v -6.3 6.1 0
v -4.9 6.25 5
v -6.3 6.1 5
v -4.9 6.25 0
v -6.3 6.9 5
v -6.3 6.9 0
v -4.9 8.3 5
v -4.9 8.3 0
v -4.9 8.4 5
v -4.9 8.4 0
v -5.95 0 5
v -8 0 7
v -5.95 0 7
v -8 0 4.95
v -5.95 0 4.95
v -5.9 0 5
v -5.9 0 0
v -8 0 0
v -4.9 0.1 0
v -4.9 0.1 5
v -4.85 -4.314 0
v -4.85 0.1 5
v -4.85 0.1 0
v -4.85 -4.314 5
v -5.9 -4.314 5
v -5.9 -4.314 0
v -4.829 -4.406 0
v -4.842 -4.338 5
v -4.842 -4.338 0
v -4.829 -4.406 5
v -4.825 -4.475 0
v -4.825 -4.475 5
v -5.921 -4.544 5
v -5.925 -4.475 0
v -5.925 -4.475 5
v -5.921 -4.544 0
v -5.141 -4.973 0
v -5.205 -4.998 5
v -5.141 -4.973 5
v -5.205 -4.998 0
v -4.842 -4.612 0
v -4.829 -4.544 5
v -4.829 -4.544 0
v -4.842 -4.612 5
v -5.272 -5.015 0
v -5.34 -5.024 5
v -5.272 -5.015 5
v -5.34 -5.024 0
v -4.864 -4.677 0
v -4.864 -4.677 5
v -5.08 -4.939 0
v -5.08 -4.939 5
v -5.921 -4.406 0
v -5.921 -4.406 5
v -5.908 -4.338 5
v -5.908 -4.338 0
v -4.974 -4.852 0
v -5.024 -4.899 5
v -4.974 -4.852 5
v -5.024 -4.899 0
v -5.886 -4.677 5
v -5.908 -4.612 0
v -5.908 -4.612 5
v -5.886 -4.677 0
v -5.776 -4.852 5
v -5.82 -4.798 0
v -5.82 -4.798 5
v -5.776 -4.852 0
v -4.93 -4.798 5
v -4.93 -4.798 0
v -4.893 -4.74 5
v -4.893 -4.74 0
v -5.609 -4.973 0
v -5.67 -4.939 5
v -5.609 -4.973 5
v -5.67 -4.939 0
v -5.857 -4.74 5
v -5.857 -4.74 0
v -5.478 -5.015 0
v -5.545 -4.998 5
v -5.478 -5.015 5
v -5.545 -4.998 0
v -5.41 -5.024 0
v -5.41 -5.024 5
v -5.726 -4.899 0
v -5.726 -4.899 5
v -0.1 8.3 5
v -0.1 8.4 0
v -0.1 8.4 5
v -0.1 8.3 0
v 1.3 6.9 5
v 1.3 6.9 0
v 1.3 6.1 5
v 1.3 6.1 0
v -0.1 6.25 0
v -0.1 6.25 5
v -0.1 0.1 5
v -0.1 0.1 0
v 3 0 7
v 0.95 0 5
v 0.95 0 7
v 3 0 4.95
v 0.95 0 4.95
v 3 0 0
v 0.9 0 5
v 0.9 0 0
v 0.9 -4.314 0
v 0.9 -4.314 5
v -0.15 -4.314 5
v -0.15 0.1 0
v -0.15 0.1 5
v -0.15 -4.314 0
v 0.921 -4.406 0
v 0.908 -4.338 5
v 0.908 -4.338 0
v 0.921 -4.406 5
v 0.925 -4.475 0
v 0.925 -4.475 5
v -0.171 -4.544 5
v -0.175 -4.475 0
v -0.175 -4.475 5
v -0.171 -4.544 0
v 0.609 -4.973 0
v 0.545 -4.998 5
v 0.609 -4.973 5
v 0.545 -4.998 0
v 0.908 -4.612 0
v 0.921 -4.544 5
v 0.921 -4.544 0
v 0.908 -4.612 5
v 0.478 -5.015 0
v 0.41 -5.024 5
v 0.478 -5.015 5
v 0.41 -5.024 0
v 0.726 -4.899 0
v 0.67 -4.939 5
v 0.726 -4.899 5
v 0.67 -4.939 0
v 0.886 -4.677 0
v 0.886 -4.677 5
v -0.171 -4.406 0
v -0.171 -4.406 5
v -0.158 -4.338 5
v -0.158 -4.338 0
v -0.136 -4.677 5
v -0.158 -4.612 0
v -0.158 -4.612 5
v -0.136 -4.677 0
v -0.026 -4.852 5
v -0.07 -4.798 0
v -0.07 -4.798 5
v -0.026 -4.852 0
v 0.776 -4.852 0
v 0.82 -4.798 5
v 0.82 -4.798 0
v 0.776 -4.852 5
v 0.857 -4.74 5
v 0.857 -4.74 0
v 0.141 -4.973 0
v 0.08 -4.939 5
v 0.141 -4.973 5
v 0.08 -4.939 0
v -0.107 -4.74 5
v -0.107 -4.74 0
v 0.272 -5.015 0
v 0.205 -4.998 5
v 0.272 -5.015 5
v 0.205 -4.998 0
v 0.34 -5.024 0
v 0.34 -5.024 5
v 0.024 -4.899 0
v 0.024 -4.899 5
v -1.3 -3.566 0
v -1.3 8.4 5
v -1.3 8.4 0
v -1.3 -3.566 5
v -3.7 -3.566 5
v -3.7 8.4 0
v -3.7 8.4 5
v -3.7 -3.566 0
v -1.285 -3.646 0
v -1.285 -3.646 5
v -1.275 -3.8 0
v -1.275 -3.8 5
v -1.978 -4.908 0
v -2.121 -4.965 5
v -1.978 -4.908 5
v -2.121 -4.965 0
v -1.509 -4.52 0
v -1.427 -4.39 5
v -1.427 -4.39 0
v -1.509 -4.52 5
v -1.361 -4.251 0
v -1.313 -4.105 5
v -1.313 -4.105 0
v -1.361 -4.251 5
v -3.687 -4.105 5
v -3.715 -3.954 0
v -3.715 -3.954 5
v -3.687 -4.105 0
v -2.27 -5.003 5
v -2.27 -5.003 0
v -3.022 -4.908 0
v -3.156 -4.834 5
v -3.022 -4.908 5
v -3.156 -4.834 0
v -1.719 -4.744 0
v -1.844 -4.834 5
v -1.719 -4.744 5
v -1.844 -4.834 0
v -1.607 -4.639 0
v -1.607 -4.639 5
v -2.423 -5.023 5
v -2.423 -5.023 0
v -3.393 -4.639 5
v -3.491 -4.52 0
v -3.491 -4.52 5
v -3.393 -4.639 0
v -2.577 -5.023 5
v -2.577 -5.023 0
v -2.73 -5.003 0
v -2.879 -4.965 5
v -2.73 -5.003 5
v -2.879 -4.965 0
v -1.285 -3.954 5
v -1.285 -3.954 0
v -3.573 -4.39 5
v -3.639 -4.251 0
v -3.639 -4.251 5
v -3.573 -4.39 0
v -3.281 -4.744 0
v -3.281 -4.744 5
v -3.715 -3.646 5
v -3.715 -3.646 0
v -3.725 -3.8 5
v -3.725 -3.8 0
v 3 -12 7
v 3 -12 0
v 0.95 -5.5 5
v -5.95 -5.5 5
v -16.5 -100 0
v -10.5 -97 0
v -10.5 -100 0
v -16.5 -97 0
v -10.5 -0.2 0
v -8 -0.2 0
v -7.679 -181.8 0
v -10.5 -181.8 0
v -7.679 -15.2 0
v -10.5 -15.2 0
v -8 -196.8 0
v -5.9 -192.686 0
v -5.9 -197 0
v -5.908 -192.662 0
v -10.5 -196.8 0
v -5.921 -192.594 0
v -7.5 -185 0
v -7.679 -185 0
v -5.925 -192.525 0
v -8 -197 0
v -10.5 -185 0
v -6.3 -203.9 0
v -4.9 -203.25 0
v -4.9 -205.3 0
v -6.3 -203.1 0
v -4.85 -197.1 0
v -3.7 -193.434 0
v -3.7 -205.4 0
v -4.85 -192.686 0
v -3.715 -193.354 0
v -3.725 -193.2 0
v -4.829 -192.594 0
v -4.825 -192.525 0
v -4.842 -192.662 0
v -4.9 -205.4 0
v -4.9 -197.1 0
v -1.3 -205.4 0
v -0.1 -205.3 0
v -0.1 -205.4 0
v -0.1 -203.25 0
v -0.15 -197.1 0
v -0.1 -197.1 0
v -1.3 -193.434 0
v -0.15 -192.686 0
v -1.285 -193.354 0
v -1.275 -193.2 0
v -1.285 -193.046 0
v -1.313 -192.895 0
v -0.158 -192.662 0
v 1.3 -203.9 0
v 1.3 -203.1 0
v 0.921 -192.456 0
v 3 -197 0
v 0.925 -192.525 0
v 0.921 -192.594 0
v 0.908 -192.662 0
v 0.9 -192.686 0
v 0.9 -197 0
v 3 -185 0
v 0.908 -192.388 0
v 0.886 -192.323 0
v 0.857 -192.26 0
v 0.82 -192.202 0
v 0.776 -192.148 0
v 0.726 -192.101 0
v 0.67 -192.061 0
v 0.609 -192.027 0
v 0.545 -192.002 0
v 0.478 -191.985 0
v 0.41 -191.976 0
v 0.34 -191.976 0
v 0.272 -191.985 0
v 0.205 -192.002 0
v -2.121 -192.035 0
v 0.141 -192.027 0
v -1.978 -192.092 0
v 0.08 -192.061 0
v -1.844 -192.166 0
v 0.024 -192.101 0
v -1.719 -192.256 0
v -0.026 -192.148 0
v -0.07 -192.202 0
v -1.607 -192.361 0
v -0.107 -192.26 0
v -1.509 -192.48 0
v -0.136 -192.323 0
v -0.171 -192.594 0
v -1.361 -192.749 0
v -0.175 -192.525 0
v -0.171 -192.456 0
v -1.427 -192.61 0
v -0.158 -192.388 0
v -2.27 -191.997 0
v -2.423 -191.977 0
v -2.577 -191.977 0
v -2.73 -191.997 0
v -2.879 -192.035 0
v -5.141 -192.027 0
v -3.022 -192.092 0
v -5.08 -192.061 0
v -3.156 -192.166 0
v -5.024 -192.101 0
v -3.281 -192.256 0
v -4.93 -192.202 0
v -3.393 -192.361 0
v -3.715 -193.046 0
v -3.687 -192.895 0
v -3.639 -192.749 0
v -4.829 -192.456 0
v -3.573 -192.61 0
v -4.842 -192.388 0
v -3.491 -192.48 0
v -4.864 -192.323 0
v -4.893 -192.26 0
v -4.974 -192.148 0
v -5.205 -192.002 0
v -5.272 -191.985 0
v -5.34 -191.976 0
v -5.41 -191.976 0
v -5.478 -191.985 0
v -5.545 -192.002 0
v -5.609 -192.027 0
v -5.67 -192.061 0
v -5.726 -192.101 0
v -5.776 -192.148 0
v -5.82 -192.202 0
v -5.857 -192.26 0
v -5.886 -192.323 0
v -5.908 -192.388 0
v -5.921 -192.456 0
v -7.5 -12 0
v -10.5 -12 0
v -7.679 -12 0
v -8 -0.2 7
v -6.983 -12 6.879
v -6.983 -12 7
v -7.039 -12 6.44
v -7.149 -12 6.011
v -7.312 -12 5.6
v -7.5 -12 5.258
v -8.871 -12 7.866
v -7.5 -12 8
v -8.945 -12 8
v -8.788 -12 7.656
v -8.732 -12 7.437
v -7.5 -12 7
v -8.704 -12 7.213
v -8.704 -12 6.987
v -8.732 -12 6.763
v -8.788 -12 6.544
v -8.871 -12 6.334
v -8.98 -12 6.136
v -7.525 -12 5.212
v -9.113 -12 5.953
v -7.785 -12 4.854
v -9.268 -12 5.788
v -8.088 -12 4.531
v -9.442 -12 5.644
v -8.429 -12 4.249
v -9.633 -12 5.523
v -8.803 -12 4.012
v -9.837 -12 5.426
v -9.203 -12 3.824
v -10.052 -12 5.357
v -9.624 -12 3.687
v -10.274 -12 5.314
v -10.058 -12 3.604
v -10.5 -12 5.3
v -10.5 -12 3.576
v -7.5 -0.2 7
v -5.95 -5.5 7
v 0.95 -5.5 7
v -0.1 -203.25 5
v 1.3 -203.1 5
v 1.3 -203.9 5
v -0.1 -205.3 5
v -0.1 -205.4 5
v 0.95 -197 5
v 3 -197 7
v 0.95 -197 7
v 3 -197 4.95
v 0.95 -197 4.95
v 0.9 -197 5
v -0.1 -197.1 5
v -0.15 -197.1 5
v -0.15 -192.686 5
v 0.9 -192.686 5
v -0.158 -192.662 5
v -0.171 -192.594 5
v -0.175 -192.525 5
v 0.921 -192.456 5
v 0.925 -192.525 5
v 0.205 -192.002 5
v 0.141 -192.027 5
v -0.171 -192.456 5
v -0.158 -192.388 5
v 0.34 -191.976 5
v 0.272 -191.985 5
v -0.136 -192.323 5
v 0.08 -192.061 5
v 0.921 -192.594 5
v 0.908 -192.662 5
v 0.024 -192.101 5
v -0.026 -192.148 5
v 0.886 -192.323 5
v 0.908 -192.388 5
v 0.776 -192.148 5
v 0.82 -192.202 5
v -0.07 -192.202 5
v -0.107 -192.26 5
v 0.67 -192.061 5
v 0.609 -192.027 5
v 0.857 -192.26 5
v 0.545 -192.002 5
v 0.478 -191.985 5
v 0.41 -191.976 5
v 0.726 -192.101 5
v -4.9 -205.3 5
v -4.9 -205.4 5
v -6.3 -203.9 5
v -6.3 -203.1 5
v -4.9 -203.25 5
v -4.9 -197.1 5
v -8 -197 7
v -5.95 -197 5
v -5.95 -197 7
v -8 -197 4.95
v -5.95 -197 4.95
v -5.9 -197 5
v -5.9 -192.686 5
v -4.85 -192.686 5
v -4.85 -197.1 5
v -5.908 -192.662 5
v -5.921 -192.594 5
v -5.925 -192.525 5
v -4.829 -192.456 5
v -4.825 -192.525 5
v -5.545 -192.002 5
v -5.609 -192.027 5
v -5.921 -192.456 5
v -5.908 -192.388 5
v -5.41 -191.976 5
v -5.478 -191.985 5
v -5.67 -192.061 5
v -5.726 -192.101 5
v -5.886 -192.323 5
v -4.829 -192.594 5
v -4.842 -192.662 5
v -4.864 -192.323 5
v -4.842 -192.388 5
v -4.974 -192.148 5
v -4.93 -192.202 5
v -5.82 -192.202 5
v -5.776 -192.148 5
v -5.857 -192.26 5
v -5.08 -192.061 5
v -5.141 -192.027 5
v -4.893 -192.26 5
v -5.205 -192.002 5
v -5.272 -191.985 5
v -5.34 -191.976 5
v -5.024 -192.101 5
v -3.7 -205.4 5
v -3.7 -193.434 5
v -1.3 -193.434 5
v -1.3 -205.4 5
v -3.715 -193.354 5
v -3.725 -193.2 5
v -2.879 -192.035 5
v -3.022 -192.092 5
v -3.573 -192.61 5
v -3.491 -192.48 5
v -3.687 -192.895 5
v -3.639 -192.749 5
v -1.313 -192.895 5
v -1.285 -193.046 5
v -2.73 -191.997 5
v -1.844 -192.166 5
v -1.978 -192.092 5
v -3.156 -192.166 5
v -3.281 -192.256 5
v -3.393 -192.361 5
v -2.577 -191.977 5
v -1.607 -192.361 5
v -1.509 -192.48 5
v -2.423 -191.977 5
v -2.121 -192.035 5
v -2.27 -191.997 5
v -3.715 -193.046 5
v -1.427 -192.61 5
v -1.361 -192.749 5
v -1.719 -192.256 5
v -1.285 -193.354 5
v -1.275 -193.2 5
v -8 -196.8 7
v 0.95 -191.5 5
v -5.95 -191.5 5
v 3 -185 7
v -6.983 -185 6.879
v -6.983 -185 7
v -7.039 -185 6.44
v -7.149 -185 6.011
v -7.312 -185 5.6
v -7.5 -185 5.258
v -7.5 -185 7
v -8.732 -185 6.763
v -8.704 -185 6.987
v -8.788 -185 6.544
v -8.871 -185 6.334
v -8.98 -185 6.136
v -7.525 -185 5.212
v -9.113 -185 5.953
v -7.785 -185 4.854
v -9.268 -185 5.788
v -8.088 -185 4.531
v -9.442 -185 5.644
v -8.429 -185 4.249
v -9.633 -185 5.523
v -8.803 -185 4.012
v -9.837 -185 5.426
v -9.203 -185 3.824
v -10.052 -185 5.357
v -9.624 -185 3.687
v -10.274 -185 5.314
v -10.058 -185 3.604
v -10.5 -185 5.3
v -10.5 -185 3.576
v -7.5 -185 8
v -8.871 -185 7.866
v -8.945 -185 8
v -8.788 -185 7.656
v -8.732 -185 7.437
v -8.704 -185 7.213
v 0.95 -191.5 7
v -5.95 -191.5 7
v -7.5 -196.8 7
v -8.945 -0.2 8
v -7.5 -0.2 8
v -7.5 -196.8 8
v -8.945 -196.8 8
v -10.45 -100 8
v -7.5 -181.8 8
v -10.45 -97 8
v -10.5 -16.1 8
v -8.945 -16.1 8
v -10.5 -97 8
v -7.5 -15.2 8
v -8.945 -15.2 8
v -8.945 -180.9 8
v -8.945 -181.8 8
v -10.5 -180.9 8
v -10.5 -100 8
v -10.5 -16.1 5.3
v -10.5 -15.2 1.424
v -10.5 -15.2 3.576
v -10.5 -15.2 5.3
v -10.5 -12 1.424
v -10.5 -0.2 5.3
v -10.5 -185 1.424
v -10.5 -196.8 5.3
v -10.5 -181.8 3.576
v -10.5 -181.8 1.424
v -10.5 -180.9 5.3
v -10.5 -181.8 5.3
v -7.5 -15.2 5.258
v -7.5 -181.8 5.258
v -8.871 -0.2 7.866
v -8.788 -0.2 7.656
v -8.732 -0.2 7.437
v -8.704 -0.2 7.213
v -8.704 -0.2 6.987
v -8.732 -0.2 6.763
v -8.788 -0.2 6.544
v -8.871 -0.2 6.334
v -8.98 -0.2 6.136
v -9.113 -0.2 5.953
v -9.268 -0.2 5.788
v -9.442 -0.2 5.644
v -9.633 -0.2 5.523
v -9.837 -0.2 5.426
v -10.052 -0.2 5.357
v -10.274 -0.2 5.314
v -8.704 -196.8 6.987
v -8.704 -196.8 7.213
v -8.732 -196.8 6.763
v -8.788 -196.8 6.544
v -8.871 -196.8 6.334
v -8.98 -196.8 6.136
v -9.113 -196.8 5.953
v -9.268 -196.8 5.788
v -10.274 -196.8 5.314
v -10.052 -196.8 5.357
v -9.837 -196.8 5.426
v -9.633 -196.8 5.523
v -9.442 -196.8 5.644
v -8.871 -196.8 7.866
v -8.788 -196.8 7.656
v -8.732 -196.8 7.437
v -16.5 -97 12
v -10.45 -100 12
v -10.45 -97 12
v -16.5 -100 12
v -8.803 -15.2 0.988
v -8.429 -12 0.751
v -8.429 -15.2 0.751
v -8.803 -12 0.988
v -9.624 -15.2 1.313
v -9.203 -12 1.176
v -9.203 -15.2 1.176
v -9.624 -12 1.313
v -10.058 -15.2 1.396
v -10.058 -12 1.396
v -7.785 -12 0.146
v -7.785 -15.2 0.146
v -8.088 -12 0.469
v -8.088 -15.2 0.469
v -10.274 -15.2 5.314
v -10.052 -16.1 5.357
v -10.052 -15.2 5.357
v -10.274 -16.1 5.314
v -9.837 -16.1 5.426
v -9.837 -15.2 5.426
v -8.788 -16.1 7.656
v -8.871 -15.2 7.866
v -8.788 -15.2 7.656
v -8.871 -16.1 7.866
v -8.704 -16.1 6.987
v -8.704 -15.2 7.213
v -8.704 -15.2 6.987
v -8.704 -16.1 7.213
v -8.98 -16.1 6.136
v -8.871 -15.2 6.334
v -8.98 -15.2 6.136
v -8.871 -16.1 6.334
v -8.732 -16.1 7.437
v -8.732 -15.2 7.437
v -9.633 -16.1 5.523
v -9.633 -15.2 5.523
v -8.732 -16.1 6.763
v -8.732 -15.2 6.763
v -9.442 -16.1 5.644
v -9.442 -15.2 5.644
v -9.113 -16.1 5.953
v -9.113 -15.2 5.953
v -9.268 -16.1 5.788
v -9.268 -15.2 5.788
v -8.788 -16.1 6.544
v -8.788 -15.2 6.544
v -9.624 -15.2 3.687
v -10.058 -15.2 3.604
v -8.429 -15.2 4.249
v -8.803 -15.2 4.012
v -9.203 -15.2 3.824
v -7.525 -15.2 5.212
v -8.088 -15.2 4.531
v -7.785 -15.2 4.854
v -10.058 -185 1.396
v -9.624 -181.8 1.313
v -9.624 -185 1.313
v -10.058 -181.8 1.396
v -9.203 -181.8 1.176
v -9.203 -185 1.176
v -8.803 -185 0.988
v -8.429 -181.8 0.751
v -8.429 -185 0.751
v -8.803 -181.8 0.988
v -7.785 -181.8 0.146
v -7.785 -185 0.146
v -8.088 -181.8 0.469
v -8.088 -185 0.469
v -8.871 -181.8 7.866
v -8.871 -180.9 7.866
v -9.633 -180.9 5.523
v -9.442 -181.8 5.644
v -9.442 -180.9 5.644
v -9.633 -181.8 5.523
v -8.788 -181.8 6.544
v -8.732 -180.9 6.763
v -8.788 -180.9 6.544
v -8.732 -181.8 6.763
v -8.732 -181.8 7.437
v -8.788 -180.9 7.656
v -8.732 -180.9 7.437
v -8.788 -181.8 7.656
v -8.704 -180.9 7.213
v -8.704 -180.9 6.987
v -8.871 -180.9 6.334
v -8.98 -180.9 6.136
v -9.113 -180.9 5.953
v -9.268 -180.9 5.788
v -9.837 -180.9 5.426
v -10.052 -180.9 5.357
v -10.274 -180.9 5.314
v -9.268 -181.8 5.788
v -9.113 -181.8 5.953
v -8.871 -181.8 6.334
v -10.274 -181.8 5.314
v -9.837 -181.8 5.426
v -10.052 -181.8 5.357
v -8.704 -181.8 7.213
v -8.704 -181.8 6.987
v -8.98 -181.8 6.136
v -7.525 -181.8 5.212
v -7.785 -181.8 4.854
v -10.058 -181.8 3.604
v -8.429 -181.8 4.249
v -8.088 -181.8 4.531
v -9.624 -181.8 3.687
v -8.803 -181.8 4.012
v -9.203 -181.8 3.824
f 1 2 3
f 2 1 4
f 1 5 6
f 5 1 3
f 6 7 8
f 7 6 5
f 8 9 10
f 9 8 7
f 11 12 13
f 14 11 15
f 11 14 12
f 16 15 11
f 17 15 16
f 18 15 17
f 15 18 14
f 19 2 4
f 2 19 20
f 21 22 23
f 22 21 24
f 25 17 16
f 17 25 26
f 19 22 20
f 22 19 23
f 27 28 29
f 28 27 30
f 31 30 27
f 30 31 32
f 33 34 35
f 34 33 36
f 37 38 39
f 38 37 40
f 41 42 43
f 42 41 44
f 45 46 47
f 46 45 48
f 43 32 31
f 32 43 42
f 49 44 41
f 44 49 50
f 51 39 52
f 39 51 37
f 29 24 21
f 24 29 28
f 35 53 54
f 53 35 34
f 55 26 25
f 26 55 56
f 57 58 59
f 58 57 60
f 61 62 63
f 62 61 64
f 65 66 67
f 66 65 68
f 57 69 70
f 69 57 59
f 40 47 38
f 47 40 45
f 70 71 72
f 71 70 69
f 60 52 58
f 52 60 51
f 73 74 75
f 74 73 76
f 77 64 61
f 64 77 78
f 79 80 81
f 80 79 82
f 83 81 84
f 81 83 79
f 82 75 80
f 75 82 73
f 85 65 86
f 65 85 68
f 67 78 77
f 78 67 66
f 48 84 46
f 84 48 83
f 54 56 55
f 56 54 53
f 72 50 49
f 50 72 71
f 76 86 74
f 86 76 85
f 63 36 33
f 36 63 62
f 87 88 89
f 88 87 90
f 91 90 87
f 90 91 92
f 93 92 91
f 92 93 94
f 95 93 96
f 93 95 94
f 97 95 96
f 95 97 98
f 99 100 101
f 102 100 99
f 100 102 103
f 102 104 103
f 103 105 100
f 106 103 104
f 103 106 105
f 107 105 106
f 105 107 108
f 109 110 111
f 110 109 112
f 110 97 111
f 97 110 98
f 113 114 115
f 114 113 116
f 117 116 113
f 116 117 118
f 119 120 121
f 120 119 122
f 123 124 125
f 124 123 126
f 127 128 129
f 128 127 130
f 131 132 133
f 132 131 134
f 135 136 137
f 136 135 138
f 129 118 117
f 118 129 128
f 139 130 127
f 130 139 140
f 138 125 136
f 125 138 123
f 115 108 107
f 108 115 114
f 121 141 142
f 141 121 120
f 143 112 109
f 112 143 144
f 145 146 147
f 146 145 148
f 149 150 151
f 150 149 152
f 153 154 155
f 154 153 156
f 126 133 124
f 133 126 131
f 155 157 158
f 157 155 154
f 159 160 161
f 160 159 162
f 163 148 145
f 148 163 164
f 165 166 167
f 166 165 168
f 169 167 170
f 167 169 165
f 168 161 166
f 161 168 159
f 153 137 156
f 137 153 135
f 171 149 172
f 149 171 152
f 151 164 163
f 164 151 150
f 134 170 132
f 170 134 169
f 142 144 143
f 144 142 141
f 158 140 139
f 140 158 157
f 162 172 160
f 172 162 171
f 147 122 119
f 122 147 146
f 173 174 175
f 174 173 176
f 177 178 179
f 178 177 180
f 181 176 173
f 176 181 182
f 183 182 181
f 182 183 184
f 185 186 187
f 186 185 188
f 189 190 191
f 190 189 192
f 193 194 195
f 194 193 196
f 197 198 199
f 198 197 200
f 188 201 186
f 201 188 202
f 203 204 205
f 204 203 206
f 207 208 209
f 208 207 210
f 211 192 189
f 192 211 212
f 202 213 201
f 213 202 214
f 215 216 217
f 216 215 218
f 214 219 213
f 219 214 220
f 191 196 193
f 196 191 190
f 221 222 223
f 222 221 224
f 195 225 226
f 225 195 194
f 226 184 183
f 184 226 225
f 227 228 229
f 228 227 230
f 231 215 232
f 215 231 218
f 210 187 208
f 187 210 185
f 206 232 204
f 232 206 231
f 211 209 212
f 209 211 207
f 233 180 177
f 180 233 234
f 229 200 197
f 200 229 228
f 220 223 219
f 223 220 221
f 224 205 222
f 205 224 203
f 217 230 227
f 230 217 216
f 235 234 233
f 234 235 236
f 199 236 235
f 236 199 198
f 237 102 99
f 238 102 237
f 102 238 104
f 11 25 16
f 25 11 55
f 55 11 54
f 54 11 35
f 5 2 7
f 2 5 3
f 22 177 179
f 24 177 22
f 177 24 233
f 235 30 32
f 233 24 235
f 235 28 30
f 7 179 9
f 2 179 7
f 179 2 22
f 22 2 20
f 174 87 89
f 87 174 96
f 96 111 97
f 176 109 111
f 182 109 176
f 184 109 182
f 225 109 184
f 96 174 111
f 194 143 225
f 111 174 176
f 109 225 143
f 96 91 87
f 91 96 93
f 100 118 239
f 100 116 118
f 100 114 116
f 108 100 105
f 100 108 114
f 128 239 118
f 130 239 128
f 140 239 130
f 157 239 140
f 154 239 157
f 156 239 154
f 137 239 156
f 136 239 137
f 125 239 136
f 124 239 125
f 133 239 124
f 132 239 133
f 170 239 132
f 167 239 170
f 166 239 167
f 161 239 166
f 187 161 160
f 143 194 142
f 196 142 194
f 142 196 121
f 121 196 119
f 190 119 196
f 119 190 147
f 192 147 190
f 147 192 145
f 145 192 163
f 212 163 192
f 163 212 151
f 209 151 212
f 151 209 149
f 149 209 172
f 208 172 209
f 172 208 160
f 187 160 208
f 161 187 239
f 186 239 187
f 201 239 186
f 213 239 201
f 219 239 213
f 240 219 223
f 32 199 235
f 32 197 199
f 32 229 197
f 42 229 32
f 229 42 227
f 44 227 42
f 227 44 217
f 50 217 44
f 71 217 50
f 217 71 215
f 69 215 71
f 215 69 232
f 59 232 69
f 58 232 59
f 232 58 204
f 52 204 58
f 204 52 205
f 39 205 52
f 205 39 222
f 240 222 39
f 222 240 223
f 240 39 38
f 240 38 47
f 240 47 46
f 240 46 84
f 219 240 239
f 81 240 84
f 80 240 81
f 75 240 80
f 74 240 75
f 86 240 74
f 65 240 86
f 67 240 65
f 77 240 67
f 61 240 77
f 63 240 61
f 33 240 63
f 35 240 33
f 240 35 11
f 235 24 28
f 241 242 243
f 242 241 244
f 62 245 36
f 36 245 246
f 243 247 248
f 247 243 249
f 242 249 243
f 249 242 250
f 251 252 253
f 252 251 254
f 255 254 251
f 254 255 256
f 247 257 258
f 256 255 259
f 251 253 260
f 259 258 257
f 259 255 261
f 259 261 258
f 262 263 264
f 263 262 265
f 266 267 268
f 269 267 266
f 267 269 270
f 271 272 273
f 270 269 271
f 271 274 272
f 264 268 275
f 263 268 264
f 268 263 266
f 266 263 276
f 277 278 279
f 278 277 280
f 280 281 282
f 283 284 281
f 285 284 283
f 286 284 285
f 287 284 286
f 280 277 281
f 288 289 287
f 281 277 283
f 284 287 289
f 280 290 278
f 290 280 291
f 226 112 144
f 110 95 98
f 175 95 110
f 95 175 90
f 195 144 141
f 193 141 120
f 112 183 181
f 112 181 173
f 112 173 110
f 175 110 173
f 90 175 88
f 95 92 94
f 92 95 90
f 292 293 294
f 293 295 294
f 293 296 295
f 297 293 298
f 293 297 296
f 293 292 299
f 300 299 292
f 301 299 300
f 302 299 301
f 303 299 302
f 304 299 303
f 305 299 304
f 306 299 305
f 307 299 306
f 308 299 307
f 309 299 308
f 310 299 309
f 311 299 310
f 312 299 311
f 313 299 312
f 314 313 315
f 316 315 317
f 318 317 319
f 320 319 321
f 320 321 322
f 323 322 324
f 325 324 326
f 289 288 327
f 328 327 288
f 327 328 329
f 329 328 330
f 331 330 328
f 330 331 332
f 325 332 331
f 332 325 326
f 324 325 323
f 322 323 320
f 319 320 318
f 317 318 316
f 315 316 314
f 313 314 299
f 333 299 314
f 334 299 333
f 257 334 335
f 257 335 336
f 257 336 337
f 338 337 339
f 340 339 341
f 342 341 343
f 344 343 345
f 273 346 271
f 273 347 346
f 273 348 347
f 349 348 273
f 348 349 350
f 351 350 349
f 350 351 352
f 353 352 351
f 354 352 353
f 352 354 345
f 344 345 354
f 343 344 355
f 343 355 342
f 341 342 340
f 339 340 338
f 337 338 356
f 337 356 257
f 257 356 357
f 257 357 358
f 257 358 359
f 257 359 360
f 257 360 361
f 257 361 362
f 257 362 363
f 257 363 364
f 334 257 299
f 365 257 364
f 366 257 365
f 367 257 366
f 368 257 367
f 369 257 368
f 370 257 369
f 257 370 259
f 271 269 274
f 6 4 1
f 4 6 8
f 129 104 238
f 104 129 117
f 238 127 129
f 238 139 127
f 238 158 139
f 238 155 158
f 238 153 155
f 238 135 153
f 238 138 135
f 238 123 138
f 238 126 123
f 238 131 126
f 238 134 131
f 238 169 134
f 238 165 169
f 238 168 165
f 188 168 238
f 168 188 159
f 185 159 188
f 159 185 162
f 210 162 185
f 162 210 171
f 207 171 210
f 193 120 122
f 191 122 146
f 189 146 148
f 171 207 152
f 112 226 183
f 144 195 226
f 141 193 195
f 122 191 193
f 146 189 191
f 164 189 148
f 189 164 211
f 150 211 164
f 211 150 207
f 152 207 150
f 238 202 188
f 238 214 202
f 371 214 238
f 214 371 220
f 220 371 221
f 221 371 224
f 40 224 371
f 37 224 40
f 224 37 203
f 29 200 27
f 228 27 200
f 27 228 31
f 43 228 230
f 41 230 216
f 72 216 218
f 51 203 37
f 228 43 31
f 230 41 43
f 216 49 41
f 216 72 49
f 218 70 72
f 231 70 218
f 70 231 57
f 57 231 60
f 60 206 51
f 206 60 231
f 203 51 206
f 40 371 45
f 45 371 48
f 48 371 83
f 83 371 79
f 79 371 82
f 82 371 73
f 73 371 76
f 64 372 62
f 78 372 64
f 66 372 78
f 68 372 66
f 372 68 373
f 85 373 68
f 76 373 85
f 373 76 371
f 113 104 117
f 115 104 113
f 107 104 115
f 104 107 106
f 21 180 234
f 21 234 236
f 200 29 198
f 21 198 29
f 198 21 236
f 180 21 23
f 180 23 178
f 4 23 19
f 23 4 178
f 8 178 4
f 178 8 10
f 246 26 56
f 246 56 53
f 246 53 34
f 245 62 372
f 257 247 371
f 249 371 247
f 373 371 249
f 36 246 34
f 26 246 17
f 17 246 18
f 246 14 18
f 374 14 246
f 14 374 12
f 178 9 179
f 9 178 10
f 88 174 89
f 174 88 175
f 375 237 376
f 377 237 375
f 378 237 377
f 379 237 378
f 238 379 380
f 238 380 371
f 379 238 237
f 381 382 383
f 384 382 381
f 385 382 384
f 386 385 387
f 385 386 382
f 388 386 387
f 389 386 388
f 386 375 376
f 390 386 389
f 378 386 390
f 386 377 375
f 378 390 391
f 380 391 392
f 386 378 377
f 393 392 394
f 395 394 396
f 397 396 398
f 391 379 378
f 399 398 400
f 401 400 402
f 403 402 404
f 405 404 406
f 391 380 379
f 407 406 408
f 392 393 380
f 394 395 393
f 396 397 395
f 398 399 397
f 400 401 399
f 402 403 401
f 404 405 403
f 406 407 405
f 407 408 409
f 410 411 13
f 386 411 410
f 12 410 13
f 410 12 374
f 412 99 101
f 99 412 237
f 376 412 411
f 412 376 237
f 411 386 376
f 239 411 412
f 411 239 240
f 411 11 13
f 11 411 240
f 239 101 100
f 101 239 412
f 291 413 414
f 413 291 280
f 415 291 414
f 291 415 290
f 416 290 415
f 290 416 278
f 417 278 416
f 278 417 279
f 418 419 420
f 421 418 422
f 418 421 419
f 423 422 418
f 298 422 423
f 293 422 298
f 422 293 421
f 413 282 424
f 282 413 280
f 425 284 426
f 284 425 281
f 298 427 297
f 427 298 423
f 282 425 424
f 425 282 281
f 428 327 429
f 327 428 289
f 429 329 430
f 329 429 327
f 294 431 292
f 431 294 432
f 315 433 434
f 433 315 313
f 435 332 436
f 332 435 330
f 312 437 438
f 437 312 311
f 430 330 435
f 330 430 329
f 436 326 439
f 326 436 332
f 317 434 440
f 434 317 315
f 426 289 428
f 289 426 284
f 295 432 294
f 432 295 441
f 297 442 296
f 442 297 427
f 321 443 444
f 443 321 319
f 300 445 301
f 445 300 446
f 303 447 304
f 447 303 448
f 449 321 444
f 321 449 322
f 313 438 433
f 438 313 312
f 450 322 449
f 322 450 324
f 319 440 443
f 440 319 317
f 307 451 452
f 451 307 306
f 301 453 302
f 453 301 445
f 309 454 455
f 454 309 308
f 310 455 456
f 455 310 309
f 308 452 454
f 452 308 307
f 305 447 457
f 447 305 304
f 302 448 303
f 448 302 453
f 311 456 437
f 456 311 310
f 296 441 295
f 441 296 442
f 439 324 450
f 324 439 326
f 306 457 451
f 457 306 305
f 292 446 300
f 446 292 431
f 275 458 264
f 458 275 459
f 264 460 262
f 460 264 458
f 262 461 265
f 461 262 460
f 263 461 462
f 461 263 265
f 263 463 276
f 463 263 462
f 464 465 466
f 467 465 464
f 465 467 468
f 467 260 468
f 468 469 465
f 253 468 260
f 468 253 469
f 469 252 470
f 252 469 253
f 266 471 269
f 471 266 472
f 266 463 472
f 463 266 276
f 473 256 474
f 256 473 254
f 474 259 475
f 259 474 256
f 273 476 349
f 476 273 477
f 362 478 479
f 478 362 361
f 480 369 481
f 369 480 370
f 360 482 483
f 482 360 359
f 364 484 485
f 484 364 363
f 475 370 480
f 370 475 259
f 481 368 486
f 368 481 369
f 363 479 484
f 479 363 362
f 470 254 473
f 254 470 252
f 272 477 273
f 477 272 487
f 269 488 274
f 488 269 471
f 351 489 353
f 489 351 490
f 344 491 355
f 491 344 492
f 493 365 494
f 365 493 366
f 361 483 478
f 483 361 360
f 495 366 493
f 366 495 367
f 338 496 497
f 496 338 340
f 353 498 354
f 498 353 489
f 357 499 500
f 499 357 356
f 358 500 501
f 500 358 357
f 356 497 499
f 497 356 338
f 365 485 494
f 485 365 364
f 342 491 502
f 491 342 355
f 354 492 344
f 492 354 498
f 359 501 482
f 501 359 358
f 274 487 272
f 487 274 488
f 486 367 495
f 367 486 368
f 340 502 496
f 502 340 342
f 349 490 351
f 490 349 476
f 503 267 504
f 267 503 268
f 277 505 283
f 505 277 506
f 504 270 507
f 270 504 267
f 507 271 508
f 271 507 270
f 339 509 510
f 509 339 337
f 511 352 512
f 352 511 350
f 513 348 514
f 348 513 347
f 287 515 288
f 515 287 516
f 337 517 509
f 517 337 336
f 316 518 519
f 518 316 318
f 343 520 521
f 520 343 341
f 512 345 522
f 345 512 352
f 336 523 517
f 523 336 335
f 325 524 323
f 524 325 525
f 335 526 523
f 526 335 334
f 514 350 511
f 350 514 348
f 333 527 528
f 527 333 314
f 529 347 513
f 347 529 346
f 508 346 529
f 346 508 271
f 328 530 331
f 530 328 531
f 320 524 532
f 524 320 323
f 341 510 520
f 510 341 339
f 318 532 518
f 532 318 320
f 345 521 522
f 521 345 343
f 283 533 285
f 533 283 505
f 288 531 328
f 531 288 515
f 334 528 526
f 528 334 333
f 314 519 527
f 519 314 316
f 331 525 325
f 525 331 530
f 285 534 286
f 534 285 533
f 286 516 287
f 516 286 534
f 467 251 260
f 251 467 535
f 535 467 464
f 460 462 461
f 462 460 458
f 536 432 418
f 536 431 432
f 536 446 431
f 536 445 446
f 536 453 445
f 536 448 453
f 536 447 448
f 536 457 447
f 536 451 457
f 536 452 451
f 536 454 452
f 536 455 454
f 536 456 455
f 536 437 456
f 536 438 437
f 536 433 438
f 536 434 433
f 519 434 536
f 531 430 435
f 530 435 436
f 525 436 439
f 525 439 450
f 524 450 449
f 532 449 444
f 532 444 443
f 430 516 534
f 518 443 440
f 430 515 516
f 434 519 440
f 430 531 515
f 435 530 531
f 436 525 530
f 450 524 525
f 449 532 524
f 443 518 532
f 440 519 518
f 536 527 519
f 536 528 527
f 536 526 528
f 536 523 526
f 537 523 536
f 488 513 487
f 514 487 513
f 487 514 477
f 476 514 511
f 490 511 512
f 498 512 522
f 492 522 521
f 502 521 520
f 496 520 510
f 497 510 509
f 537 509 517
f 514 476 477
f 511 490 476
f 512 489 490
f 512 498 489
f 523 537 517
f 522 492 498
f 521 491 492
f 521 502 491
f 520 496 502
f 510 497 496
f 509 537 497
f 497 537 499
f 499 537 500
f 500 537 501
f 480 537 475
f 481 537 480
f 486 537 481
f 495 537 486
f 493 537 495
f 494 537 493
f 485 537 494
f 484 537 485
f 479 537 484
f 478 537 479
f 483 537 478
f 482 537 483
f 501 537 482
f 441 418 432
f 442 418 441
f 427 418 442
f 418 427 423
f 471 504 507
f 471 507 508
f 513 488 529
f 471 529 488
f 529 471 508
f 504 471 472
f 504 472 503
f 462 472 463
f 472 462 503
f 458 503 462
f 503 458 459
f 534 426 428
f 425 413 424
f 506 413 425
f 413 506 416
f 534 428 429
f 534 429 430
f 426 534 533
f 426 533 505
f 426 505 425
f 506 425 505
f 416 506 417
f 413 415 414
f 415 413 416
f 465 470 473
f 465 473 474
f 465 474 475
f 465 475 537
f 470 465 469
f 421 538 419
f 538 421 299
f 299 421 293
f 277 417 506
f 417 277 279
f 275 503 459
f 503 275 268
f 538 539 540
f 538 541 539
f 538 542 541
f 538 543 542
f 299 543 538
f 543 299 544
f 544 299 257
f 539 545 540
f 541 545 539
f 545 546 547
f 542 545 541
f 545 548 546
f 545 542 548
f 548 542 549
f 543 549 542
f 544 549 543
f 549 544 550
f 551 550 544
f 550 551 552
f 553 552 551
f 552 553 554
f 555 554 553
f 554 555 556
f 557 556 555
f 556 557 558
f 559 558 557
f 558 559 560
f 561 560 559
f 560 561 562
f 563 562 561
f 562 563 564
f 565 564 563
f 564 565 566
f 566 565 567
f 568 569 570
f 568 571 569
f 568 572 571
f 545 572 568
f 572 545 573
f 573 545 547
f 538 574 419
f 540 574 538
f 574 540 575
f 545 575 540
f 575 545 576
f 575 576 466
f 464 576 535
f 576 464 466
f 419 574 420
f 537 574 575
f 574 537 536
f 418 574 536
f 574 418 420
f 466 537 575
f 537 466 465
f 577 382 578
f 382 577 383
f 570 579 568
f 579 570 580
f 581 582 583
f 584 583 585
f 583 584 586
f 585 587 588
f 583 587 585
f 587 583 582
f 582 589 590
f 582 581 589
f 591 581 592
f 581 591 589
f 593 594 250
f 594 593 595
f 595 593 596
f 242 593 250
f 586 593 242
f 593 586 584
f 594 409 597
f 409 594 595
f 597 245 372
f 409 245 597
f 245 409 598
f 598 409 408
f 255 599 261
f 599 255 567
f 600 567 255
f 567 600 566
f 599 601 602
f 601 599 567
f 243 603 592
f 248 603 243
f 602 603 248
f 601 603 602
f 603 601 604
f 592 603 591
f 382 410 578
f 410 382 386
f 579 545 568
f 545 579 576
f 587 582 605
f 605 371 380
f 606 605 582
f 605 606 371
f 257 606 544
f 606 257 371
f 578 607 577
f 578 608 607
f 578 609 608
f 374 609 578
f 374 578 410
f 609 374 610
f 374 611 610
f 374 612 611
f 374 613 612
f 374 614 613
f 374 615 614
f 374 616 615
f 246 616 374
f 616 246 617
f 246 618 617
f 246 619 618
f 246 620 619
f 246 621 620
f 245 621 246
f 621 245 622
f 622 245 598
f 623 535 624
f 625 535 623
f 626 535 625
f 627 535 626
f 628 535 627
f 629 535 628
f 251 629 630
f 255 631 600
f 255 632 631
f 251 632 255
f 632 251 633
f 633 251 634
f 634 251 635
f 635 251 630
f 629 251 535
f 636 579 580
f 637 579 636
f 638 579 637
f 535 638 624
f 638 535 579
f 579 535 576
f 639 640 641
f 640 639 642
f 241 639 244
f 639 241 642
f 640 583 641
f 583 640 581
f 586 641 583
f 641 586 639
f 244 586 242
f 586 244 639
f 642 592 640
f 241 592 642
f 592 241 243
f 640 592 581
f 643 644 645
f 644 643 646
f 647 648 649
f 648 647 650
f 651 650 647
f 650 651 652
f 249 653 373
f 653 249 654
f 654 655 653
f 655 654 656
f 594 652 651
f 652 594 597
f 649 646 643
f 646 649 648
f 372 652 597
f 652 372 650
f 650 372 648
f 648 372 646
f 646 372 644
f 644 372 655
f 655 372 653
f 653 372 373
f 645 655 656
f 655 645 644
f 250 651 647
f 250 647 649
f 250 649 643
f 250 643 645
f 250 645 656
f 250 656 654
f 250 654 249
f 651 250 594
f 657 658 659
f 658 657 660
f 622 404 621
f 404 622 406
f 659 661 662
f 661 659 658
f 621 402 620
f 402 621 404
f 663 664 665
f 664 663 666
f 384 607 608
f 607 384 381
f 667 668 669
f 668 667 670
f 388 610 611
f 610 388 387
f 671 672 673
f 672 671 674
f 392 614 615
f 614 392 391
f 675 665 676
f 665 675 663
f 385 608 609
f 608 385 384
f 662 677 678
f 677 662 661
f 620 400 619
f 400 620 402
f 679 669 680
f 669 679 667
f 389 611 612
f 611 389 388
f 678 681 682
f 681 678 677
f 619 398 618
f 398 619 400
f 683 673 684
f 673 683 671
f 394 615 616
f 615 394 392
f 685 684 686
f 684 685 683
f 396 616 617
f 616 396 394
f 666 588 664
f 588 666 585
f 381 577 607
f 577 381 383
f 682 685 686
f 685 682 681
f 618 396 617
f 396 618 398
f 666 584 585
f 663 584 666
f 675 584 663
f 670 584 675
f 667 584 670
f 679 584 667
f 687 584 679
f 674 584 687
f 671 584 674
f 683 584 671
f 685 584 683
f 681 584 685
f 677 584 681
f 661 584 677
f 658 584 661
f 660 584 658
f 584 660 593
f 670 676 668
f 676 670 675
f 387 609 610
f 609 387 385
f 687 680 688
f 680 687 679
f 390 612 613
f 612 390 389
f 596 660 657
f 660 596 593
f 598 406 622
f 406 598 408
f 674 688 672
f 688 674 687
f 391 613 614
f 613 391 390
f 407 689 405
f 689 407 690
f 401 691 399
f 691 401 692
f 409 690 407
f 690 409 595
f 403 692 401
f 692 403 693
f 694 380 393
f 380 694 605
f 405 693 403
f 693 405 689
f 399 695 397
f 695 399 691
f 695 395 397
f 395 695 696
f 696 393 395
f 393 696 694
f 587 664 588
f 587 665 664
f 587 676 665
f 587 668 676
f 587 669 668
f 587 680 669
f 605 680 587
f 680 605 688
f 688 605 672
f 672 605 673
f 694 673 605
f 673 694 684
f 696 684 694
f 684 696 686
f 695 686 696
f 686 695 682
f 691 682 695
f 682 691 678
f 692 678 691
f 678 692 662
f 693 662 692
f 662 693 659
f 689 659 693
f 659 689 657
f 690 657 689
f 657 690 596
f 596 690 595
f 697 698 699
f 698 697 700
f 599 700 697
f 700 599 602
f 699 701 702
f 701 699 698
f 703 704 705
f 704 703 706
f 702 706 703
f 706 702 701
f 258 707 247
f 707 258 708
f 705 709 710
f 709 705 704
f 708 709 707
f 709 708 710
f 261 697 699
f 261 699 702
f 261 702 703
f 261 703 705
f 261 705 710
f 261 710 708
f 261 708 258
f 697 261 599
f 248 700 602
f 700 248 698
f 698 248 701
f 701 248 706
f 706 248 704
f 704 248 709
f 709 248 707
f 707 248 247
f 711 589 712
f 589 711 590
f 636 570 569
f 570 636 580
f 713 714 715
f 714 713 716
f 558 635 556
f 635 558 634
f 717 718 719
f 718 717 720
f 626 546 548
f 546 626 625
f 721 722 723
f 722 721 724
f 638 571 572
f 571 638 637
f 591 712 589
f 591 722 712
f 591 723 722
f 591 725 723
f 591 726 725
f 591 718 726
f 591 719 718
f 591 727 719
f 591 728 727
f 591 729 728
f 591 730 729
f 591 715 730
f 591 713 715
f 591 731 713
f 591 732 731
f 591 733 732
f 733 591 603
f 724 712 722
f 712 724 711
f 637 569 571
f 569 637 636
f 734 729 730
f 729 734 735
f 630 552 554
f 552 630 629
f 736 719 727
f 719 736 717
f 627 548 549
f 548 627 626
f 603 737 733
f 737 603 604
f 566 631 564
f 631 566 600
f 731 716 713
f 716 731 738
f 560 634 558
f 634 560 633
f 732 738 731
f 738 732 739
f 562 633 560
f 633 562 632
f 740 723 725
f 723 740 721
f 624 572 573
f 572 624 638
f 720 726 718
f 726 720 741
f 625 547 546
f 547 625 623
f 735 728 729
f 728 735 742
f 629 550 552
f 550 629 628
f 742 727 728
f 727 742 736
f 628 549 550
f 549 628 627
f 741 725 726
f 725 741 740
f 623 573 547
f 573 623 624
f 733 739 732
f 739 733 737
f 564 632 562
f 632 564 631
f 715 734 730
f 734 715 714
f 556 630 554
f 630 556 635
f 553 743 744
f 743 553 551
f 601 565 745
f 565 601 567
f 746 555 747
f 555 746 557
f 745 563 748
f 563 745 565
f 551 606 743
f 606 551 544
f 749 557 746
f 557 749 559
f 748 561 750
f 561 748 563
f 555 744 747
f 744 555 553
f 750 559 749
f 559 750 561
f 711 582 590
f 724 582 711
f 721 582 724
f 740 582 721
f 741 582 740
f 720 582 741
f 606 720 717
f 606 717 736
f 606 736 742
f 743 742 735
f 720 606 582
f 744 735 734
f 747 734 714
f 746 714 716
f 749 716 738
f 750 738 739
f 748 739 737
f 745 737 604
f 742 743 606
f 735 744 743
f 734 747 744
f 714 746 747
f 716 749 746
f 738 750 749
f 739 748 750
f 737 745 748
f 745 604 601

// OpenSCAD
$fn = 50;

difference() {
	union() {
		translate(v = [0, 0, 0]) {
			rotate(a = [0, 0, 0]) {
				difference() {
					union() {
						translate(v = [0, 0, 2.5]) {
							rotate(a = [0, -90, 0]) {
								difference() {
									union() {
										translate(v = [0, 0, 0]) {
											rotate(a = [0, 0, 0]) {
												difference() {
													union() {
														translate(v = [-2.5, 0, 2.5]) {
															rotate(a = [0, 90.0, 0]) {
																difference() {
																	union() {
																		translate(v = [0, 0, 0]) {
																			rotate(a = [0, 0, 0]) {
																				difference() {
																					union() {
																						translate(v = [0, 0, 0]) {
																							rotate(a = [0, 0, 0]) {
																								difference() {
																									union() {
																										translate(v = [-5.5, -12.0, 0]) {
																											cube(size = [11.0, 20.4, 5.0]);
																										}
																									}
																									union() {
																										translate(v = [0, 0, -0.1]) {
																											linear_extrude(height = 5.2) {
																												polygon(points = [[-2.4, 0], [-2.4, 6.25], [-3.8, 6.1], [-3.8, 6.8999999999999995], [-2.4, 8.299999999999999], [-2.4, 9.399999999999999], [-5.7, 9.399999999999999], [-5.7, 0]]);
																											}
																										}
																										translate(v = [0, 0, -0.1]) {
																											linear_extrude(height = 5.2) {
																												polygon(points = [[-2.35, -4.5], [-2.35, -4.3875], [-2.35, -4.275], [-2.35, -4.1625], [-2.35, -4.05], [-2.35, -3.9375], [-2.35, -3.825], [-2.35, -3.7125], [-2.35, -3.6], [-2.35, -3.4875], [-2.35, -3.375], [-2.35, -3.2625], [-2.35, -3.15], [-2.35, -3.0375], [-2.35, -2.925], [-2.35, -2.8125], [-2.35, -2.7], [-2.35, -2.5875], [-2.35, -2.475], [-2.35, -2.3625], [-2.35, -2.25], [-2.35, -2.1375], [-2.35, -2.025], [-2.35, -1.9125], [-2.35, -1.7999999999999998], [-2.35, -1.6875], [-2.35, -1.5750000000000002], [-2.35, -1.4625], [-2.35, -1.35], [-2.35, -1.2374999999999998], [-2.35, -1.125], [-2.35, -1.0125000000000002], [-2.35, -0.8999999999999999], [-2.35, -0.7875000000000001], [-2.35, -0.6749999999999998], [-2.35, -0.5625], [-2.35, -0.4500000000000002], [-2.35, -0.33750000000000036], [-2.35, -0.22499999999999964], [-2.35, -0.11249999999999982], [-2.35, 0.0], [-2.35, 0.1], [-3.4, 0.1], [-3.4, -4.5]]);
																											}
																										}
																										translate(v = [-2.875, -4.475, -0.1]) {
																											cylinder(h = 5.2, r = 0.55);
																										}
																										translate(v = [0, 0, -0.1]) {
																											linear_extrude(height = 5.2) {
																												polygon(points = [[2.4, 0], [2.4, 6.25], [3.8, 6.1], [3.8, 6.8999999999999995], [2.4, 8.299999999999999], [2.4, 9.399999999999999], [5.7, 9.399999999999999], [5.7, 0]]);
																											}
																										}
																										translate(v = [0, 0, -0.1]) {
																											linear_extrude(height = 5.2) {
																												polygon(points = [[2.35, -4.5], [2.35, -4.3875], [2.35, -4.275], [2.35, -4.1625], [2.35, -4.05], [2.35, -3.9375], [2.35, -3.825], [2.35, -3.7125], [2.35, -3.6], [2.35, -3.4875], [2.35, -3.375], [2.35, -3.2625], [2.35, -3.15], [2.35, -3.0375], [2.35, -2.925], [2.35, -2.8125], [2.35, -2.7], [2.35, -2.5875], [2.35, -2.475], [2.35, -2.3625], [2.35, -2.25], [2.35, -2.1375], [2.35, -2.025], [2.35, -1.9125], [2.35, -1.7999999999999998], [2.35, -1.6875], [2.35, -1.5750000000000002], [2.35, -1.4625], [2.35, -1.35], [2.35, -1.2374999999999998], [2.35, -1.125], [2.35, -1.0125000000000002], [2.35, -0.8999999999999999], [2.35, -0.7875000000000001], [2.35, -0.6749999999999998], [2.35, -0.5625], [2.35, -0.4500000000000002], [2.35, -0.33750000000000036], [2.35, -0.22499999999999964], [2.35, -0.11249999999999982], [2.35, 0.0], [2.35, 0.1], [3.4, 0.1], [3.4, -4.5]]);
																											}
																										}
																										translate(v = [2.875, -4.475, -0.1]) {
																											cylinder(h = 5.2, r = 0.55);
																										}
																										translate(v = [0, 0, -0.1]) {
																											linear_extrude(height = 5.2) {
																												polygon(points = [[-1.2, -3.8499999999999996], [-1.2, -3.6607142857142856], [-1.2, -3.471428571428571], [-1.2, -3.2821428571428566], [-1.2, -3.0928571428571425], [-1.2, -2.9035714285714285], [-1.2, -2.714285714285714], [-1.2, -2.5249999999999995], [-1.2, -2.3357142857142854], [-1.2, -2.1464285714285714], [-1.2, -1.9571428571428569], [-1.2, -1.7678571428571423], [-1.2, -1.5785714285714283], [-1.2, -1.3892857142857138], [-1.2, -1.1999999999999997], [-1.2, -1.0107142857142852], [-1.2, -0.8214285714285712], [-1.2, -0.6321428571428567], [-1.2, -0.4428571428571426], [-1.2, -0.2535714285714281], [-1.2, -0.06428571428571406], [-1.2, 0], [-1.2, 0.12500000000000044], [-1.2, 0.31428571428571495], [-1.2, 0.503571428571429], [-1.2, 0.6928571428571431], [-1.2, 0.8821428571428571], [-1.2, 1.071428571428572], [-1.2, 1.2607142857142861], [-1.2, 1.4500000000000002], [-1.2, 1.6392857142857142], [-1.2, 1.8285714285714292], [-1.2, 2.0178571428571432], [-1.2, 2.2071428571428573], [-1.2, 2.3964285714285714], [-1.2, 2.5857142857142863], [-1.2, 2.7750000000000004], [-1.2, 2.9642857142857144], [-1.2, 3.1535714285714294], [-1.2, 3.3428571428571434], [-1.2, 3.5321428571428575], [-1.2, 3.7214285714285715], [-1.2, 3.9107142857142865], [-1.2, 4.1000000000000005], [-1.2, 4.289285714285715], [-1.2, 4.4785714285714295], [-1.2, 4.667857142857143], [-1.2, 4.857142857142858], [-1.2, 5.046428571428573], [-1.2, 5.235714285714286], [-1.2, 5.425000000000001], [-1.2, 5.614285714285714], [-1.2, 5.803571428571429], [-1.2, 5.992857142857144], [-1.2, 6.1], [-1.2, 6.182142857142857], [-1.2, 6.25], [-1.2, 6.371428571428572], [-1.2, 6.560714285714287], [-1.2, 6.75], [-1.2, 6.939285714285715], [-1.2, 7.128571428571428], [-1.2, 7.317857142857143], [-1.2, 7.507142857142858], [-1.2, 7.696428571428571], [-1.2, 7.885714285714286], [-1.2, 8.075000000000001], [-1.2, 8.264285714285714], [-1.2, 8.45357142857143], [-1.2, 8.642857142857142], [-1.2, 8.832142857142857], [-1.2, 9.021428571428572], [-1.2, 9.210714285714285], [-1.2, 9.4], [1.2, 9.4], [1.2, 9.210714285714285], [1.2, 9.021428571428572], [1.2, 8.832142857142857], [1.2, 8.642857142857142], [1.2, 8.45357142857143], [1.2, 8.264285714285714], [1.2, 8.075000000000001], [1.2, 7.885714285714286], [1.2, 7.696428571428571], [1.2, 7.507142857142858], [1.2, 7.317857142857143], [1.2, 7.128571428571428], [1.2, 6.939285714285715], [1.2, 6.75], [1.2, 6.560714285714287], [1.2, 6.371428571428572], [1.2, 6.25], [1.2, 6.182142857142857], [1.2, 6.1], [1.2, 5.992857142857144], [1.2, 5.803571428571429], [1.2, 5.614285714285714], [1.2, 5.425000000000001], [1.2, 5.235714285714286], [1.2, 5.046428571428573], [1.2, 4.857142857142858], [1.2, 4.667857142857143], [1.2, 4.4785714285714295], [1.2, 4.289285714285715], [1.2, 4.1000000000000005], [1.2, 3.9107142857142865], [1.2, 3.7214285714285715], [1.2, 3.5321428571428575], [1.2, 3.3428571428571434], [1.2, 3.1535714285714294], [1.2, 2.9642857142857144], [1.2, 2.7750000000000004], [1.2, 2.5857142857142863], [1.2, 2.3964285714285714], [1.2, 2.2071428571428573], [1.2, 2.0178571428571432], [1.2, 1.8285714285714292], [1.2, 1.6392857142857142], [1.2, 1.4500000000000002], [1.2, 1.2607142857142861], [1.2, 1.071428571428572], [1.2, 0.8821428571428571], [1.2, 0.6928571428571431], [1.2, 0.503571428571429], [1.2, 0.31428571428571495], [1.2, 0.12500000000000044], [1.2, 0], [1.2, -0.06428571428571406], [1.2, -0.2535714285714281], [1.2, -0.4428571428571426], [1.2, -0.6321428571428567], [1.2, -0.8214285714285712], [1.2, -1.0107142857142852], [1.2, -1.1999999999999997], [1.2, -1.3892857142857138], [1.2, -1.5785714285714283], [1.2, -1.7678571428571423], [1.2, -1.9571428571428569], [1.2, -2.1464285714285714], [1.2, -2.3357142857142854], [1.2, -2.5249999999999995], [1.2, -2.714285714285714], [1.2, -2.9035714285714285], [1.2, -3.0928571428571425], [1.2, -3.2821428571428566], [1.2, -3.471428571428571], [1.2, -3.6607142857142856], [1.2, -3.8499999999999996]]);
																											}
																										}
																										translate(v = [0, -3.8, -0.1]) {
																											cylinder(h = 5.2, r = 1.2249999999999999);
																										}
																									}
																								}
																							}
																						}
																						translate(v = [0, 0, 0]) {
																							rotate(a = [0, 0, 0]) {
																								difference() {
																									union() {
																										translate(v = [-5.5, -12.0, 4.95]) {
																											cube(size = [11.0, 6.5, 2.05]);
																										}
																									}
																									union();
																								}
																							}
																						}
																						translate(v = [-5.5, -12.0, 4.95]) {
																							cube(size = [2.0500000000000003, 12.0, 2.05]);
																						}
																						translate(v = [3.4499999999999997, -12.0, 4.95]) {
																							cube(size = [2.0500000000000003, 12.0, 2.05]);
																						}
																					}
																					union();
																				}
																			}
																		}
																	}
																	union();
																}
															}
														}
													}
													union();
												}
											}
										}
										translate(v = [-2.5, -197.0, 2.5]) {
											rotate(a = [180, -90, 0]) {
												difference() {
													union() {
														translate(v = [0, 0, 0]) {
															rotate(a = [0, 0, 0]) {
																difference() {
																	union() {
																		translate(v = [0, 0, 0]) {
																			rotate(a = [0, 0, 0]) {
																				difference() {
																					union() {
																						translate(v = [-5.5, -12.0, 0]) {
																							cube(size = [11.0, 20.4, 5.0]);
																						}
																					}
																					union() {
																						translate(v = [0, 0, -0.1]) {
																							linear_extrude(height = 5.2) {
																								polygon(points = [[-2.4, 0], [-2.4, 6.25], [-3.8, 6.1], [-3.8, 6.8999999999999995], [-2.4, 8.299999999999999], [-2.4, 9.399999999999999], [-5.7, 9.399999999999999], [-5.7, 0]]);
																							}
																						}
																						translate(v = [0, 0, -0.1]) {
																							linear_extrude(height = 5.2) {
																								polygon(points = [[-2.35, -4.5], [-2.35, -4.3875], [-2.35, -4.275], [-2.35, -4.1625], [-2.35, -4.05], [-2.35, -3.9375], [-2.35, -3.825], [-2.35, -3.7125], [-2.35, -3.6], [-2.35, -3.4875], [-2.35, -3.375], [-2.35, -3.2625], [-2.35, -3.15], [-2.35, -3.0375], [-2.35, -2.925], [-2.35, -2.8125], [-2.35, -2.7], [-2.35, -2.5875], [-2.35, -2.475], [-2.35, -2.3625], [-2.35, -2.25], [-2.35, -2.1375], [-2.35, -2.025], [-2.35, -1.9125], [-2.35, -1.7999999999999998], [-2.35, -1.6875], [-2.35, -1.5750000000000002], [-2.35, -1.4625], [-2.35, -1.35], [-2.35, -1.2374999999999998], [-2.35, -1.125], [-2.35, -1.0125000000000002], [-2.35, -0.8999999999999999], [-2.35, -0.7875000000000001], [-2.35, -0.6749999999999998], [-2.35, -0.5625], [-2.35, -0.4500000000000002], [-2.35, -0.33750000000000036], [-2.35, -0.22499999999999964], [-2.35, -0.11249999999999982], [-2.35, 0.0], [-2.35, 0.1], [-3.4, 0.1], [-3.4, -4.5]]);
																							}
																						}
																						translate(v = [-2.875, -4.475, -0.1]) {
																							cylinder(h = 5.2, r = 0.55);
																						}
																						translate(v = [0, 0, -0.1]) {
																							linear_extrude(height = 5.2) {
																								polygon(points = [[2.4, 0], [2.4, 6.25], [3.8, 6.1], [3.8, 6.8999999999999995], [2.4, 8.299999999999999], [2.4, 9.399999999999999], [5.7, 9.399999999999999], [5.7, 0]]);
																							}
																						}
																						translate(v = [0, 0, -0.1]) {
																							linear_extrude(height = 5.2) {
																								polygon(points = [[2.35, -4.5], [2.35, -4.3875], [2.35, -4.275], [2.35, -4.1625], [2.35, -4.05], [2.35, -3.9375], [2.35, -3.825], [2.35, -3.7125], [2.35, -3.6], [2.35, -3.4875], [2.35, -3.375], [2.35, -3.2625], [2.35, -3.15], [2.35, -3.0375], [2.35, -2.925], [2.35, -2.8125], [2.35, -2.7], [2.35, -2.5875], [2.35, -2.475], [2.35, -2.3625], [2.35, -2.25], [2.35, -2.1375], [2.35, -2.025], [2.35, -1.9125], [2.35, -1.7999999999999998], [2.35, -1.6875], [2.35, -1.5750000000000002], [2.35, -1.4625], [2.35, -1.35], [2.35, -1.2374999999999998], [2.35, -1.125], [2.35, -1.0125000000000002], [2.35, -0.8999999999999999], [2.35, -0.7875000000000001], [2.35, -0.6749999999999998], [2.35, -0.5625], [2.35, -0.4500000000000002], [2.35, -0.33750000000000036], [2.35, -0.22499999999999964], [2.35, -0.11249999999999982], [2.35, 0.0], [2.35, 0.1], [3.4, 0.1], [3.4, -4.5]]);
																							}
																						}
																						translate(v = [2.875, -4.475, -0.1]) {
																							cylinder(h = 5.2, r = 0.55);
																						}
																						translate(v = [0, 0, -0.1]) {
																							linear_extrude(height = 5.2) {
																								polygon(points = [[-1.2, -3.8499999999999996], [-1.2, -3.6607142857142856], [-1.2, -3.471428571428571], [-1.2, -3.2821428571428566], [-1.2, -3.0928571428571425], [-1.2, -2.9035714285714285], [-1.2, -2.714285714285714], [-1.2, -2.5249999999999995], [-1.2, -2.3357142857142854], [-1.2, -2.1464285714285714], [-1.2, -1.9571428571428569], [-1.2, -1.7678571428571423], [-1.2, -1.5785714285714283], [-1.2, -1.3892857142857138], [-1.2, -1.1999999999999997], [-1.2, -1.0107142857142852], [-1.2, -0.8214285714285712], [-1.2, -0.6321428571428567], [-1.2, -0.4428571428571426], [-1.2, -0.2535714285714281], [-1.2, -0.06428571428571406], [-1.2, 0], [-1.2, 0.12500000000000044], [-1.2, 0.31428571428571495], [-1.2, 0.503571428571429], [-1.2, 0.6928571428571431], [-1.2, 0.8821428571428571], [-1.2, 1.071428571428572], [-1.2, 1.2607142857142861], [-1.2, 1.4500000000000002], [-1.2, 1.6392857142857142], [-1.2, 1.8285714285714292], [-1.2, 2.0178571428571432], [-1.2, 2.2071428571428573], [-1.2, 2.3964285714285714], [-1.2, 2.5857142857142863], [-1.2, 2.7750000000000004], [-1.2, 2.9642857142857144], [-1.2, 3.1535714285714294], [-1.2, 3.3428571428571434], [-1.2, 3.5321428571428575], [-1.2, 3.7214285714285715], [-1.2, 3.9107142857142865], [-1.2, 4.1000000000000005], [-1.2, 4.289285714285715], [-1.2, 4.4785714285714295], [-1.2, 4.667857142857143], [-1.2, 4.857142857142858], [-1.2, 5.046428571428573], [-1.2, 5.235714285714286], [-1.2, 5.425000000000001], [-1.2, 5.614285714285714], [-1.2, 5.803571428571429], [-1.2, 5.992857142857144], [-1.2, 6.1], [-1.2, 6.182142857142857], [-1.2, 6.25], [-1.2, 6.371428571428572], [-1.2, 6.560714285714287], [-1.2, 6.75], [-1.2, 6.939285714285715], [-1.2, 7.128571428571428], [-1.2, 7.317857142857143], [-1.2, 7.507142857142858], [-1.2, 7.696428571428571], [-1.2, 7.885714285714286], [-1.2, 8.075000000000001], [-1.2, 8.264285714285714], [-1.2, 8.45357142857143], [-1.2, 8.642857142857142], [-1.2, 8.832142857142857], [-1.2, 9.021428571428572], [-1.2, 9.210714285714285], [-1.2, 9.4], [1.2, 9.4], [1.2, 9.210714285714285], [1.2, 9.021428571428572], [1.2, 8.832142857142857], [1.2, 8.642857142857142], [1.2, 8.45357142857143], [1.2, 8.264285714285714], [1.2, 8.075000000000001], [1.2, 7.885714285714286], [1.2, 7.696428571428571], [1.2, 7.507142857142858], [1.2, 7.317857142857143], [1.2, 7.128571428571428], [1.2, 6.939285714285715], [1.2, 6.75], [1.2, 6.560714285714287], [1.2, 6.371428571428572], [1.2, 6.25], [1.2, 6.182142857142857], [1.2, 6.1], [1.2, 5.992857142857144], [1.2, 5.803571428571429], [1.2, 5.614285714285714], [1.2, 5.425000000000001], [1.2, 5.235714285714286], [1.2, 5.046428571428573], [1.2, 4.857142857142858], [1.2, 4.667857142857143], [1.2, 4.4785714285714295], [1.2, 4.289285714285715], [1.2, 4.1000000000000005], [1.2, 3.9107142857142865], [1.2, 3.7214285714285715], [1.2, 3.5321428571428575], [1.2, 3.3428571428571434], [1.2, 3.1535714285714294], [1.2, 2.9642857142857144], [1.2, 2.7750000000000004], [1.2, 2.5857142857142863], [1.2, 2.3964285714285714], [1.2, 2.2071428571428573], [1.2, 2.0178571428571432], [1.2, 1.8285714285714292], [1.2, 1.6392857142857142], [1.2, 1.4500000000000002], [1.2, 1.2607142857142861], [1.2, 1.071428571428572], [1.2, 0.8821428571428571], [1.2, 0.6928571428571431], [1.2, 0.503571428571429], [1.2, 0.31428571428571495], [1.2, 0.12500000000000044], [1.2, 0], [1.2, -0.06428571428571406], [1.2, -0.2535714285714281], [1.2, -0.4428571428571426], [1.2, -0.6321428571428567], [1.2, -0.8214285714285712], [1.2, -1.0107142857142852], [1.2, -1.1999999999999997], [1.2, -1.3892857142857138], [1.2, -1.5785714285714283], [1.2, -1.7678571428571423], [1.2, -1.9571428571428569], [1.2, -2.1464285714285714], [1.2, -2.3357142857142854], [1.2, -2.5249999999999995], [1.2, -2.714285714285714], [1.2, -2.9035714285714285], [1.2, -3.0928571428571425], [1.2, -3.2821428571428566], [1.2, -3.471428571428571], [1.2, -3.6607142857142856], [1.2, -3.8499999999999996]]);
																							}
																						}
																						translate(v = [0, -3.8, -0.1]) {
																							cylinder(h = 5.2, r = 1.2249999999999999);
																						}
																					}
																				}
																			}
																		}
																		translate(v = [0, 0, 0]) {
																			rotate(a = [0, 0, 0]) {
																				difference() {
																					union() {
																						translate(v = [-5.5, -12.0, 4.95]) {
																							cube(size = [11.0, 6.5, 2.05]);
																						}
																					}
																					union();
																				}
																			}
																		}
																		translate(v = [-5.5, -12.0, 4.95]) {
																			cube(size = [2.0500000000000003, 12.0, 2.05]);
																		}
																		translate(v = [3.4499999999999997, -12.0, 4.95]) {
																			cube(size = [2.0500000000000003, 12.0, 2.05]);
																		}
																	}
																	union();
																}
															}
														}
													}
													union();
												}
											}
										}
										translate(v = [-2.5, -196.8, 7.5]) {
											cube(size = [8.0, 196.6, 3.0]);
										}
										translate(v = [-2.5, -100.0, 10.45]) {
											cube(size = [12.0, 3.0, 6.05]);
										}
									}
									union() {
										translate(v = [-4.600000000499989, 0.1, 10.5]) {
											rotate(a = [90, 0, 0]) {
												cylinder(h = 16.2, r = 1.8);
											}
										}
										translate(v = [-4.600000000499989, -12.0, 10.5]) {
											rotate(a = [90, 0, 0]) {
												cylinder(h = 3.2, r = 3.5235);
											}
										}
										translate(v = [4.600000000499989, 0.1, 10.5]) {
											rotate(a = [90, 0, 0]) {
												cylinder(h = 16.2, r = 1.8);
											}
										}
										translate(v = [4.600000000499989, -12.0, 10.5]) {
											rotate(a = [90, 0, 0]) {
												cylinder(h = 3.2, r = 3.5235);
											}
										}
										translate(v = [-4.600000000499989, -197.1, 10.5]) {
											rotate(a = [-90, 0, 0]) {
												cylinder(h = 16.2, r = 1.8);
											}
										}
										translate(v = [-4.600000000499989, -185.0, 10.5]) {
											rotate(a = [-90, 0, 0]) {
												cylinder(h = 3.2, r = 3.5235);
											}
										}
										translate(v = [4.600000000499989, -197.1, 10.5]) {
											rotate(a = [-90, 0, 0]) {
												cylinder(h = 16.2, r = 1.8);
											}
										}
										translate(v = [4.600000000499989, -185.0, 10.5]) {
											rotate(a = [-90, 0, 0]) {
												cylinder(h = 3.2, r = 3.5235);
											}
										}
									}
								}
							}
						}
					}
					union();
				}
			}
		}
	}
	union();
}
